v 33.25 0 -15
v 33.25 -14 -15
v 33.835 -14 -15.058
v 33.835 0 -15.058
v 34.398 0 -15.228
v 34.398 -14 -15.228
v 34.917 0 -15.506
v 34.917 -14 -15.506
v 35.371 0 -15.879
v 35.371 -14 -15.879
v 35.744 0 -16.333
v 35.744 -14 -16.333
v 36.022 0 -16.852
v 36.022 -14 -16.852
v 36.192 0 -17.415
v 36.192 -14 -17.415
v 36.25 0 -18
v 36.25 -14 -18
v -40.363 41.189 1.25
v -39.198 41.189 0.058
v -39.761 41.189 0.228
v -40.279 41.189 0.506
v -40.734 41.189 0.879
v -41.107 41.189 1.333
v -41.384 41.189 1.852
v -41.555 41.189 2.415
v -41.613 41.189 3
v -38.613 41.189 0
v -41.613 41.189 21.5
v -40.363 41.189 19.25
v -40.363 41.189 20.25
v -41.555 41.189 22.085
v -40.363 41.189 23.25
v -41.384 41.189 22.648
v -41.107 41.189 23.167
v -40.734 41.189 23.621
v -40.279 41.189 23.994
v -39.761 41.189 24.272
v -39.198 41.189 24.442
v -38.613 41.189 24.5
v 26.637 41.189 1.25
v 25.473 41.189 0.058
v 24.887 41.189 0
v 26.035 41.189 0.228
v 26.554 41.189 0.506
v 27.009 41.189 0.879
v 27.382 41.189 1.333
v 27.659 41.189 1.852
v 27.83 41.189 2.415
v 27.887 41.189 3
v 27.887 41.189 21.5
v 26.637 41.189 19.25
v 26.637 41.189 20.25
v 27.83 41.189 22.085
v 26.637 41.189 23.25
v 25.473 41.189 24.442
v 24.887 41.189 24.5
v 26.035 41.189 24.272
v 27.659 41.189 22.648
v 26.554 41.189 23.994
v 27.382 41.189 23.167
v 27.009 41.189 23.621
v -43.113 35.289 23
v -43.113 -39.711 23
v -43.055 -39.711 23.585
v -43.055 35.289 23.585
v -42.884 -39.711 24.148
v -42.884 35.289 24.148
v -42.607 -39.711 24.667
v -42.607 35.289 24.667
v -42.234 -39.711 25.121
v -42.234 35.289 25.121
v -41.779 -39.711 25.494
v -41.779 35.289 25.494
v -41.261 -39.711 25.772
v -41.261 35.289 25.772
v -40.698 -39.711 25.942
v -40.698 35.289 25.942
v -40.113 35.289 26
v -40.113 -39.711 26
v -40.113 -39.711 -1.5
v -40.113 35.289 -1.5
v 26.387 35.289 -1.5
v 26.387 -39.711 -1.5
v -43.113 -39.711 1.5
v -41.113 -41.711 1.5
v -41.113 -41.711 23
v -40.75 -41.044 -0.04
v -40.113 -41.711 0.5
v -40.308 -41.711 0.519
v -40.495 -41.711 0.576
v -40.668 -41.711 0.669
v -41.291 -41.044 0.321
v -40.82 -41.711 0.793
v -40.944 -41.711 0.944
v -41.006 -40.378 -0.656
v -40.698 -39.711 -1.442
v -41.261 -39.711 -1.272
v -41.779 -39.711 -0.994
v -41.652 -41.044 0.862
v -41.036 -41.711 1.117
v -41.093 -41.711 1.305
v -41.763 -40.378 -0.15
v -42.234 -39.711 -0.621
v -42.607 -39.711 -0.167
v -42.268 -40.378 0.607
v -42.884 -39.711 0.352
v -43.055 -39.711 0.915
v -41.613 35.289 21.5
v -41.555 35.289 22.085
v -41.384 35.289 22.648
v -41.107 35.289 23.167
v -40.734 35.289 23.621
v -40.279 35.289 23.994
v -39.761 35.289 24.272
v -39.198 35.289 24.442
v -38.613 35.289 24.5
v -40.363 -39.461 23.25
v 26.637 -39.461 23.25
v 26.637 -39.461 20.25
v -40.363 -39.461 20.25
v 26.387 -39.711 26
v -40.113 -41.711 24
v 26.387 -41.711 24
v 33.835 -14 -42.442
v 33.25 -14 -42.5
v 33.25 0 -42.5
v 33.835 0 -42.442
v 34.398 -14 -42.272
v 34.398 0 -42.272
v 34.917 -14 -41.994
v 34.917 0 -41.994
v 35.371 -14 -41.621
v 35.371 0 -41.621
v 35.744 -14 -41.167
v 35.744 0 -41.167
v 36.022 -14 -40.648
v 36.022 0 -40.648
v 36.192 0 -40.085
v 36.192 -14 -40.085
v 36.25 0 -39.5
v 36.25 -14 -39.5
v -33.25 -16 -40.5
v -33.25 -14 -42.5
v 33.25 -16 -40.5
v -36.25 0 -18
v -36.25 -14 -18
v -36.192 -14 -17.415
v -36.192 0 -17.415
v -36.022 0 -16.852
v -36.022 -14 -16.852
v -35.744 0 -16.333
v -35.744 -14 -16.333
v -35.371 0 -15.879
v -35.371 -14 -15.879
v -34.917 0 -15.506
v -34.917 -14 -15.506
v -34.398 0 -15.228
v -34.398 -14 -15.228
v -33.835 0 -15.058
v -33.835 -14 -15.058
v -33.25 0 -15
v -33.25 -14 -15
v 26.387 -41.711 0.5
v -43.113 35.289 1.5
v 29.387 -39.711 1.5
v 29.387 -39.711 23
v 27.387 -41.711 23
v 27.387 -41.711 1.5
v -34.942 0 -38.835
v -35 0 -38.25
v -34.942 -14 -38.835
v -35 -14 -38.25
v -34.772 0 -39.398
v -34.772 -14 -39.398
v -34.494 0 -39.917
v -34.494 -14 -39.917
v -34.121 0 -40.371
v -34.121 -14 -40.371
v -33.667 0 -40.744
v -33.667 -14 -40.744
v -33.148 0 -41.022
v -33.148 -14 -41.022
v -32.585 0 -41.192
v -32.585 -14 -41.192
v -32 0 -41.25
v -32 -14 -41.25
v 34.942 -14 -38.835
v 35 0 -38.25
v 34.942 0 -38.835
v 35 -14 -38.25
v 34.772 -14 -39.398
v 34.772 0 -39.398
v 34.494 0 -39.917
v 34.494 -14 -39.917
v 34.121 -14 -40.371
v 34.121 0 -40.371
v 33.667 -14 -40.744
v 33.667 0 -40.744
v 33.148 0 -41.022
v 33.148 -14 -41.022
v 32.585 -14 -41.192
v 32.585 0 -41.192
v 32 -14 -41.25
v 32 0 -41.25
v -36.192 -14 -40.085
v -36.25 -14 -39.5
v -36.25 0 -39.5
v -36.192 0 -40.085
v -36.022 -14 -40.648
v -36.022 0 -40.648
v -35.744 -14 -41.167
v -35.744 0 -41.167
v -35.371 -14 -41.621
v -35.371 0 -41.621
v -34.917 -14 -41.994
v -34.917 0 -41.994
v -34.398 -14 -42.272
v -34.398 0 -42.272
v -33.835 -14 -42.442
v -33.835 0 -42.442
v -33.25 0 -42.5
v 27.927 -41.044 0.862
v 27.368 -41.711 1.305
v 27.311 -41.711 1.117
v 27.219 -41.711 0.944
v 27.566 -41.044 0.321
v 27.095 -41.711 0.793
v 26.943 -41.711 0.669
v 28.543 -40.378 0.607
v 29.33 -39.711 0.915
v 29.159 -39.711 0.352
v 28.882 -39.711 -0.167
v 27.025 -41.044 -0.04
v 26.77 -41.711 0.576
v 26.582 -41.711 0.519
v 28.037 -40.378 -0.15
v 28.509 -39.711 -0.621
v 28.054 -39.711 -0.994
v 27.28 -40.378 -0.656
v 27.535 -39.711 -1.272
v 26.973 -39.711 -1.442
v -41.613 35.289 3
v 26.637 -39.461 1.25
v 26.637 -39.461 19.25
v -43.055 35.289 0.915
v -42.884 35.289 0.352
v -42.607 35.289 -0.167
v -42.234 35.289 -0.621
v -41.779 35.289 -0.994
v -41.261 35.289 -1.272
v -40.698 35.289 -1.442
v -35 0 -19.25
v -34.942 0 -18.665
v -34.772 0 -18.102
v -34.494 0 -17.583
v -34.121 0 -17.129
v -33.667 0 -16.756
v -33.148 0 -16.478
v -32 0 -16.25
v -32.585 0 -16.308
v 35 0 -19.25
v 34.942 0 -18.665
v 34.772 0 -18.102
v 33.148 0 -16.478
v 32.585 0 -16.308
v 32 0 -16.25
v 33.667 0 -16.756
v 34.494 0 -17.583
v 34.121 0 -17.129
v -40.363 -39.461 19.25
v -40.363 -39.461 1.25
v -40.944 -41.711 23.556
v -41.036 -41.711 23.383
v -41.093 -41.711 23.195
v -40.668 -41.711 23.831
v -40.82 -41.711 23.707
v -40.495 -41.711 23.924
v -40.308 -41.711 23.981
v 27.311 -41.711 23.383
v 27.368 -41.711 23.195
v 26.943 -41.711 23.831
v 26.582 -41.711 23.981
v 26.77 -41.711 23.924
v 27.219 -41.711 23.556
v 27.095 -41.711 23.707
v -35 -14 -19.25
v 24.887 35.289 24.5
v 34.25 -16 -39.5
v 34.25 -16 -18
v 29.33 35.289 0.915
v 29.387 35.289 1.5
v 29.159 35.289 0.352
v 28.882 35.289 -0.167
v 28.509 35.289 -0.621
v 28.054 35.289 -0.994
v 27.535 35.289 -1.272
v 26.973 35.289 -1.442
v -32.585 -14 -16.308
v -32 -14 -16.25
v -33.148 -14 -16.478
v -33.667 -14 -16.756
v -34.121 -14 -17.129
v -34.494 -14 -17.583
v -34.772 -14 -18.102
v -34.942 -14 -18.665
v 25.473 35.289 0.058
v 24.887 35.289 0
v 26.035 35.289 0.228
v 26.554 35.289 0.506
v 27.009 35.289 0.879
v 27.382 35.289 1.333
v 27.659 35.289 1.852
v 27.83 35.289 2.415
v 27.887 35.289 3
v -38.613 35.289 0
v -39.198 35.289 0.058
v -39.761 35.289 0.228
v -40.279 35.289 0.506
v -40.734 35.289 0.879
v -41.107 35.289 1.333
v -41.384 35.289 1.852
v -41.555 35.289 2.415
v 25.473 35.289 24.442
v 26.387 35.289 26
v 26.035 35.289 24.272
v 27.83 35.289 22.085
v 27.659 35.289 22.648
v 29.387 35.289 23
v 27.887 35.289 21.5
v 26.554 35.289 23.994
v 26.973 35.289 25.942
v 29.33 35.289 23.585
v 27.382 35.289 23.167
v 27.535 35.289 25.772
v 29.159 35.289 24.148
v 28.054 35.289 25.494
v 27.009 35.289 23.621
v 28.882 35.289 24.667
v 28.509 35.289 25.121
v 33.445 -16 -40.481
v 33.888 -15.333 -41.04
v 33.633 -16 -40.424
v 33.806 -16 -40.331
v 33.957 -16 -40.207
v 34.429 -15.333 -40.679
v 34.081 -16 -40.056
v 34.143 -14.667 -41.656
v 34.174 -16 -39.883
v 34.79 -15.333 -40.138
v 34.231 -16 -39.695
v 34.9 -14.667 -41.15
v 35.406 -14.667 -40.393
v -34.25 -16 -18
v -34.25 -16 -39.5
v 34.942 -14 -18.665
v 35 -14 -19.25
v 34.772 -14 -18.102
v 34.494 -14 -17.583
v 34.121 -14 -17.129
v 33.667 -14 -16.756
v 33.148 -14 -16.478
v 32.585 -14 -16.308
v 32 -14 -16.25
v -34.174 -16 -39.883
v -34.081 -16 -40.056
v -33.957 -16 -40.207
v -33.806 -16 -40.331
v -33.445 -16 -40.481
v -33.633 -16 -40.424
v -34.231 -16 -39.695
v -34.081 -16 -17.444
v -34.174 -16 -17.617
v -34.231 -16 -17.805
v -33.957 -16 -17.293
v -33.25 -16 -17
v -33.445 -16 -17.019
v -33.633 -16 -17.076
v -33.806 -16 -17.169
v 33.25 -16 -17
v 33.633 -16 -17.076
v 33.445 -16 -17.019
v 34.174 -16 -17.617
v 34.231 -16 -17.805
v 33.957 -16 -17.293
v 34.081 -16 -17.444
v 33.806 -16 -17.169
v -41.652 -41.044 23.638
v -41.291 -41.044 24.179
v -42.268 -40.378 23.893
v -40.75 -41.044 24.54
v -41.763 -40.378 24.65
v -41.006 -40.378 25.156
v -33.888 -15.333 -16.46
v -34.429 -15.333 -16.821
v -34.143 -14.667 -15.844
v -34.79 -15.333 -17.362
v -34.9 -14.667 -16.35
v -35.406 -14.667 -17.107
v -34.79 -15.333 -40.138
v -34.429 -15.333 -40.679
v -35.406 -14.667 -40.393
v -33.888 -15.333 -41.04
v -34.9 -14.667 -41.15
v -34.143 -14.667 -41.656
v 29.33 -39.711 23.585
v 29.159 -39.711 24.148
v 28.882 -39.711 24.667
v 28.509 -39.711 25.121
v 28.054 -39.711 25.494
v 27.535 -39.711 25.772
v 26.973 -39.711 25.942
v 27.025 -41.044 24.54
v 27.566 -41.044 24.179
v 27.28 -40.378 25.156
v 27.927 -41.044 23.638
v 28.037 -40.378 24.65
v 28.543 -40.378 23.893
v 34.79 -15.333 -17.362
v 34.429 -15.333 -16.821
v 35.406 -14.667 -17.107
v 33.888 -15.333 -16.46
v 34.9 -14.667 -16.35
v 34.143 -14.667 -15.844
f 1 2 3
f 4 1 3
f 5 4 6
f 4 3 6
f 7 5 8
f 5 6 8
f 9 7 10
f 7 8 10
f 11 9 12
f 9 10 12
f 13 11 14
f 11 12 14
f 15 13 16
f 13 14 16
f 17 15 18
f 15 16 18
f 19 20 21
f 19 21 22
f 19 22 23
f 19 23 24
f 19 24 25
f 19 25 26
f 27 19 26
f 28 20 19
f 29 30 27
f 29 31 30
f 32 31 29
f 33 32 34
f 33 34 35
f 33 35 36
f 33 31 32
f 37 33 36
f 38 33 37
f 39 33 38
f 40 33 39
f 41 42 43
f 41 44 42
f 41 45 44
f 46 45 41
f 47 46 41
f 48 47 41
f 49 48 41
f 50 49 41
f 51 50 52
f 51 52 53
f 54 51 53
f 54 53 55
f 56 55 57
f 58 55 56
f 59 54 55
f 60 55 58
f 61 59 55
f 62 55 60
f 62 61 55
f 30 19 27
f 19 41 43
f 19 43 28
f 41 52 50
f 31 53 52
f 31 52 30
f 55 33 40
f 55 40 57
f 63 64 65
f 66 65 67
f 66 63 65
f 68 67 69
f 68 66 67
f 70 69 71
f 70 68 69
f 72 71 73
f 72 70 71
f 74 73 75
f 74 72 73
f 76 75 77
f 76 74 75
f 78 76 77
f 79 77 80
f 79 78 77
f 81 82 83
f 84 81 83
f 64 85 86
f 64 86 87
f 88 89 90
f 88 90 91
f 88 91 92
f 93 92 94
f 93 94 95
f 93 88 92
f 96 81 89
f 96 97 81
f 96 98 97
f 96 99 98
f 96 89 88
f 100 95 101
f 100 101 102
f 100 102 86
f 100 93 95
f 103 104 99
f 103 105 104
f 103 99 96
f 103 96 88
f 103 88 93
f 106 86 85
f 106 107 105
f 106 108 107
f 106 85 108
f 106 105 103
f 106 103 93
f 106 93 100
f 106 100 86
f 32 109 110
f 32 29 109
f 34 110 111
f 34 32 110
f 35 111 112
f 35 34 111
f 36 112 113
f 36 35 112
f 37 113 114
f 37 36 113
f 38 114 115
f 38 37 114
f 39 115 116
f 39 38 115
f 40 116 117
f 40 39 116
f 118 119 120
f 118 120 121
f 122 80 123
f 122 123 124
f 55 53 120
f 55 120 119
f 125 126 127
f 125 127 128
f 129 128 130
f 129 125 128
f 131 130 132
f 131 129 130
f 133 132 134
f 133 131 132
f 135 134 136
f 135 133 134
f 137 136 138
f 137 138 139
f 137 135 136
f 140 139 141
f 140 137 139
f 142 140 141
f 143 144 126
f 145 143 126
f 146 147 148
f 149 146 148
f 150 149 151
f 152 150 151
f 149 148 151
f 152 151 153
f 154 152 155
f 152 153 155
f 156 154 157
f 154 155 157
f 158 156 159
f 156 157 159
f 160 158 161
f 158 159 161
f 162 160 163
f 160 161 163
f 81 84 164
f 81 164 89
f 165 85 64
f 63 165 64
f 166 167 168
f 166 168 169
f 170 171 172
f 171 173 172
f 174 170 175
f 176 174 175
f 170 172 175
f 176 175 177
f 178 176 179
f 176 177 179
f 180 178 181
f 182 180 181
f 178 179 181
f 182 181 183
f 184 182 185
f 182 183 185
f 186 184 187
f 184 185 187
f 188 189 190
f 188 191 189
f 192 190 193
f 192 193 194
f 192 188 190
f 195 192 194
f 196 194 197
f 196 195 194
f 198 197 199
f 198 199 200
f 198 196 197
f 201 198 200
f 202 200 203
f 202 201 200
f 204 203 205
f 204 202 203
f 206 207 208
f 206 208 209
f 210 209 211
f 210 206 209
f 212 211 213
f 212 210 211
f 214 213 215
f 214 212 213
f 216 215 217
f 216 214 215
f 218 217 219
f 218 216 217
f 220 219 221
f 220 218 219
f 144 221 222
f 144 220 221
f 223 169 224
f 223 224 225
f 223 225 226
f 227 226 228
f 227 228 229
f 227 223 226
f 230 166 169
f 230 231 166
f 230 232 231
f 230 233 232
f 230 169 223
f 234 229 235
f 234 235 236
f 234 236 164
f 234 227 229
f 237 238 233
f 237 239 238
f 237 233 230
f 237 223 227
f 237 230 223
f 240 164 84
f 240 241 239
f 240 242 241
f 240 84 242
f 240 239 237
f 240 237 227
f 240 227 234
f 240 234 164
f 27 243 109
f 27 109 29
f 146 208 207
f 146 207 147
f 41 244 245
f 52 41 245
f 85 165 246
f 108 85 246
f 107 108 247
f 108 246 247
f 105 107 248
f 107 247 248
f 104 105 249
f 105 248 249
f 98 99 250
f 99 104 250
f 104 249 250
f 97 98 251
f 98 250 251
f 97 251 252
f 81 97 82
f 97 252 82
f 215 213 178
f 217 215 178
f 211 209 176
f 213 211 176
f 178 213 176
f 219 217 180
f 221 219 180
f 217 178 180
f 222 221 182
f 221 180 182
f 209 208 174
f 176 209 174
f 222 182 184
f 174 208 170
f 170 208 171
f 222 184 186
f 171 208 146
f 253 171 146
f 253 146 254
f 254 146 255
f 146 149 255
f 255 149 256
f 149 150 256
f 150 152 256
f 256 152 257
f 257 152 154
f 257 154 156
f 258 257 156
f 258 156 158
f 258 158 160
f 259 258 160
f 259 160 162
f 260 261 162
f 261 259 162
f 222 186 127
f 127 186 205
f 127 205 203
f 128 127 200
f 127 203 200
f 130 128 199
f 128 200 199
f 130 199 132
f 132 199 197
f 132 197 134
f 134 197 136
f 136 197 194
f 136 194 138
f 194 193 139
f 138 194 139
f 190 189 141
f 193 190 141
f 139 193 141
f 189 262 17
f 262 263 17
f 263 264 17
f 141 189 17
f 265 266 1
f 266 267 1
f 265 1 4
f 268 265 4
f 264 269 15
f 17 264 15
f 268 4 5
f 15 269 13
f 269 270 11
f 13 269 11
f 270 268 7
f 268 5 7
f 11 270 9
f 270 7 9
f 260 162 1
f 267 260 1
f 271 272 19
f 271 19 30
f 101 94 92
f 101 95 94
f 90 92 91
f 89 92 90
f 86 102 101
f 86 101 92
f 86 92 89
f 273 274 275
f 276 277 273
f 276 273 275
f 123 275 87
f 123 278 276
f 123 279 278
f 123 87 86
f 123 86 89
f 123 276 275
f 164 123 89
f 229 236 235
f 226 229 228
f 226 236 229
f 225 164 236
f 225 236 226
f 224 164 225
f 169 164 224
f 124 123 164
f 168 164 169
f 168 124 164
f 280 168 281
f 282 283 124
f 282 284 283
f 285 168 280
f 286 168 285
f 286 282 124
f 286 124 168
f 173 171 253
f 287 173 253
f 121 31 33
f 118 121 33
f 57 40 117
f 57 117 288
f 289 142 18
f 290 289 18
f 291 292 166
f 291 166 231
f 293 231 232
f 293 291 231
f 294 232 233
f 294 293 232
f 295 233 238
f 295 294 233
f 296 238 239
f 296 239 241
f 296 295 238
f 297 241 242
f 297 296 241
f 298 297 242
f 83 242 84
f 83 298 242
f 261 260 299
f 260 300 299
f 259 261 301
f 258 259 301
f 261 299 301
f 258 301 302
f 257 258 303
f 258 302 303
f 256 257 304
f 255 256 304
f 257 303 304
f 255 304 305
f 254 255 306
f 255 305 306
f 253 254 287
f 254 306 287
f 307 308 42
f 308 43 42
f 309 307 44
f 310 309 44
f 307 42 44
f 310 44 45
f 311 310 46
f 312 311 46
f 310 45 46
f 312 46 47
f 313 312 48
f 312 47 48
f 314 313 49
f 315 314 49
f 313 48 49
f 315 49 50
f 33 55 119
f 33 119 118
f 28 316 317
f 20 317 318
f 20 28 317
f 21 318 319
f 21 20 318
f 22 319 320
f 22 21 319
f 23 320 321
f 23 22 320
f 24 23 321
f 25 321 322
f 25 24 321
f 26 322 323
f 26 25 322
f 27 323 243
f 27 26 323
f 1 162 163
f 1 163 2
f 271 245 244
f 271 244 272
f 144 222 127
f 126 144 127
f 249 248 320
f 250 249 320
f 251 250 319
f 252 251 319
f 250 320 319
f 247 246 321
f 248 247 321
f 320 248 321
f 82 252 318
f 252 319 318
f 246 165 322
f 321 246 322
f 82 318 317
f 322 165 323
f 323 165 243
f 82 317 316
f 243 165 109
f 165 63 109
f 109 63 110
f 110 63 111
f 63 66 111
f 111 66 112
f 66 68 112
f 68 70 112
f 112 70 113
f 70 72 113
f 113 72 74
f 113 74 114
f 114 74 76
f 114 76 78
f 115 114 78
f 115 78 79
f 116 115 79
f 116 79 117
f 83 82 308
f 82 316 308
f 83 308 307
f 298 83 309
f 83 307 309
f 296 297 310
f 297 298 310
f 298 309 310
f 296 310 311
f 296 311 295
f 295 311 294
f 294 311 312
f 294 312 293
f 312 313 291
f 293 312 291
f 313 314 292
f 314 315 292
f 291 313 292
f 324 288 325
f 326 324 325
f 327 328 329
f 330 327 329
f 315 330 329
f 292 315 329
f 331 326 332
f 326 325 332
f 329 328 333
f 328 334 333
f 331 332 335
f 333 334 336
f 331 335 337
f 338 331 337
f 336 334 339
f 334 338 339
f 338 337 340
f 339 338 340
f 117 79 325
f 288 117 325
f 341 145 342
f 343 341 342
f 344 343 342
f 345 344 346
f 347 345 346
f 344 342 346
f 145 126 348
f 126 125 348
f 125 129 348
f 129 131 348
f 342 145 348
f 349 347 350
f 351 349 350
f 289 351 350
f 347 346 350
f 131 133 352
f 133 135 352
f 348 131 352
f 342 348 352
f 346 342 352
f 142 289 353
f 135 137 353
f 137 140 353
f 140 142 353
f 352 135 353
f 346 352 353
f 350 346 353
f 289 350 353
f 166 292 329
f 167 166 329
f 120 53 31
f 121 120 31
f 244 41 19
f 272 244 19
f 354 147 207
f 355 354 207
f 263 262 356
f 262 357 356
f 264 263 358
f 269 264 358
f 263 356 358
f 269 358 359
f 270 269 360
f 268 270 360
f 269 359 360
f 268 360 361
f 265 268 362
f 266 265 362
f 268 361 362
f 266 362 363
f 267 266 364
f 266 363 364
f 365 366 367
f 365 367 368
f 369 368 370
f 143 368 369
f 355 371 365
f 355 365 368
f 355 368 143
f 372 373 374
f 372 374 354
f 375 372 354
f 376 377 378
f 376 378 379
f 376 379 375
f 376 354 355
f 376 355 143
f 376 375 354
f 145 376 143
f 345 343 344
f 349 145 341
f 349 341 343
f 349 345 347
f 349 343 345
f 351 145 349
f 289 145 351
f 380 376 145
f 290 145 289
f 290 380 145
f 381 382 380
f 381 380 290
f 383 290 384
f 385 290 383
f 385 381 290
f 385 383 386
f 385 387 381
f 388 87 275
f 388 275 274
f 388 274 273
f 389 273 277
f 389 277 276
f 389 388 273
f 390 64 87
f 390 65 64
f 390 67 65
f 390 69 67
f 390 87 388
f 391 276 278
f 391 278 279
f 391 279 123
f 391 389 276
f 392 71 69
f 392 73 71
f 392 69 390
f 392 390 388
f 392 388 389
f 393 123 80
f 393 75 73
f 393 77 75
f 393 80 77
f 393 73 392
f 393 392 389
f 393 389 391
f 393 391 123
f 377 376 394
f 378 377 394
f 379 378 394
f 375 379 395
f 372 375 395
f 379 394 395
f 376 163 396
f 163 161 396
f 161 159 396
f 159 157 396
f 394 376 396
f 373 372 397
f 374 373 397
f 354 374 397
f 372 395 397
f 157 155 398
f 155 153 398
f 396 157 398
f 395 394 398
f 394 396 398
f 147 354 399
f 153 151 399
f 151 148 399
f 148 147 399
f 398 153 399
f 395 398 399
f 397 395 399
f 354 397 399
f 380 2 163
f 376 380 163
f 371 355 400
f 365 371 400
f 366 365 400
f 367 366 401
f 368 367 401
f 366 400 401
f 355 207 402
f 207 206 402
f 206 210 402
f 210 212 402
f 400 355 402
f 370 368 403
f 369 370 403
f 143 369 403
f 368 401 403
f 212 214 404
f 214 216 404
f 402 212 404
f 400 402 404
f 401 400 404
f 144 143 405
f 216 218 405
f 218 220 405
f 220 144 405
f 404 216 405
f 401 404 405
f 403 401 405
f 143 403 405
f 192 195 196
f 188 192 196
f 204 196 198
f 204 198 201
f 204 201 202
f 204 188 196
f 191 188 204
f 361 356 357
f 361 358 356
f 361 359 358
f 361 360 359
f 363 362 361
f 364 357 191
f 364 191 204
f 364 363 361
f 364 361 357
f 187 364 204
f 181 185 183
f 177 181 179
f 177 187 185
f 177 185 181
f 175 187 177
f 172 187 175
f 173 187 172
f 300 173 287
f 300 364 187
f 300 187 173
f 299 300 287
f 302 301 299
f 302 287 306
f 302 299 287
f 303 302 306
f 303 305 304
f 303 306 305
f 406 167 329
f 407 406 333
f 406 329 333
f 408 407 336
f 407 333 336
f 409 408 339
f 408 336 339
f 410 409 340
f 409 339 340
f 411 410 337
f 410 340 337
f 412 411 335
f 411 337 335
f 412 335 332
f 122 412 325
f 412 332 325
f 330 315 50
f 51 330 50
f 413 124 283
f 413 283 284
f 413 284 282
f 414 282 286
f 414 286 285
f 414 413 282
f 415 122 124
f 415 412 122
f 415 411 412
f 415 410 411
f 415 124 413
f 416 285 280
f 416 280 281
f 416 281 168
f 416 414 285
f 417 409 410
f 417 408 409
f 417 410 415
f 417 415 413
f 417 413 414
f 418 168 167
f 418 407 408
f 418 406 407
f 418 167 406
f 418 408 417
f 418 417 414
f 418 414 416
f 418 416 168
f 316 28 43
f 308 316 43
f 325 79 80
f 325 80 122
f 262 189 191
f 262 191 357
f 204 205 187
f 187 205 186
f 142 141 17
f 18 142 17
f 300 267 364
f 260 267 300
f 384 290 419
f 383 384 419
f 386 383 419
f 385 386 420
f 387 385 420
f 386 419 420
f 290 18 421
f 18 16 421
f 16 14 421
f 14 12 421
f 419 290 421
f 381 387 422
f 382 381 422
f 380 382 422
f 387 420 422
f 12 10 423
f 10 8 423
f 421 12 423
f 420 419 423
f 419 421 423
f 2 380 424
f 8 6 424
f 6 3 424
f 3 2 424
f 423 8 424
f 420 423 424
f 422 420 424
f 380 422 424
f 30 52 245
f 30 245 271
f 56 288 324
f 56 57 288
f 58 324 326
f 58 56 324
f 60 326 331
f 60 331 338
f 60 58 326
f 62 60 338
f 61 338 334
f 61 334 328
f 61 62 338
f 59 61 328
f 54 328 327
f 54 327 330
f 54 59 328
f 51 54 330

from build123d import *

# Parameters (mm, degrees)
F0_W       = 69.5
F0_H       = 89.25
F1_DEPTH   = 24.5
F2_W       = 67
F2_H       = 18
F3_DEPTH   = 87
F4_W       = 67
F4_H       = 3
F5_DEPTH   = 87
F6_W       = 72.5
F6_H       = 27.5
F6_W_2     = 69.5
F6_H_2     = 24.5
F7_DEPTH   = 77
F8_W       = 6.35
F8_H       = 24.5
F1_FACE3_W = 12.25
F1_FACE3_H = 24.5
F9_DEPTH   = 70
F10_W      = 72.5
F10_H      = 27.5
F11_DEPTH  = 16
F12_W      = 70
F12_H      = 25
F13_DEPTH  = 14
F14_R      = 3
F15_SIZE   = 2
F16_R      = 3
F17_SIZE   = 2
F18_R      = 3
F19_R      = 3


# Not quite as in the source:
# - a feature names something its author has since deleted; it is built from what else it names


with BuildPart() as f1:
    # F0 (on Top) → F1 (new body)
    with BuildSketch(Plane.XY):
        with Locations((-6.8625951707, 2.9138845081)):
            Rectangle(F0_W, F0_H)
    extrude(amount=F1_DEPTH)

    # F2 (on face) → F3 (cut)
    with BuildSketch(Plane(origin=(0, 47.5388845081, 0), x_dir=(-1, 0, 0), z_dir=(0, 1, 0))):
        with Locations((6.8625951707, 10.25)):
            Rectangle(F2_W, F2_H)
    extrude(amount=-F3_DEPTH, mode=Mode.SUBTRACT)

    # F4 (on face) → F5 (cut)
    with BuildSketch(Plane(origin=(0, 47.5388845081, 0), x_dir=(-1, 0, 0), z_dir=(0, 1, 0))):
        with Locations((6.8625951707, 21.75)):
            Rectangle(F4_W, F4_H)
    extrude(amount=-F5_DEPTH, mode=Mode.SUBTRACT)

    # F6 (on face) → F7 (join)
    with BuildSketch(Plane.XZ.offset(41.7111154919)):
        with Locations((-6.8625951707, 12.25)):
            Rectangle(F6_W, F6_H)
        with Locations((-6.8625951707, 12.25)):
            Rectangle(F6_W_2, F6_H_2, mode=Mode.SUBTRACT)
    extrude(amount=-F7_DEPTH)

    # F8 (on face) + F1_face3 (on face) → F9 (cut)
    with BuildSketch(Plane.YZ.offset(27.8874048293)):
        with Locations((44.3638845081, 12.25)):
            Rectangle(F8_W, F8_H)
    with BuildSketch(Plane(origin=(-41.6125951707, 41.4138845081, 12.25), x_dir=(0, -1, 0), z_dir=(-1, 0, 0))):
        Rectangle(F1_FACE3_W, F1_FACE3_H)
    extrude(amount=-F9_DEPTH, dir=(1, 0, 0), mode=Mode.SUBTRACT)

    # F16
    f16_edges = [f1.edges().sort_by_distance(p)[0] for p in [
        (29.387405, -3.211115, -1.5),
        (29.387405, -3.211115, 26),
        (-43.112595, -3.211115, -1.5),
        (-43.112595, -3.211115, 26),
    ]]
    fillet(f16_edges, radius=F16_R)

    # F17
    f17_edges = [f1.edges().sort_by_distance(p)[0] for p in [
        (-6.862595, -41.711115, 26),
        (28.508725, -41.711115, 25.12132),
        (-42.233916, -41.711115, 25.12132),
        (29.387405, -41.711115, 12.25),
        (-43.112595, -41.711115, 12.25),
        (28.508725, -41.711115, -0.62132),
        (-42.233916, -41.711115, -0.62132),
        (-6.862595, -41.711115, -1.5),
    ]]
    chamfer(f17_edges, length=F17_SIZE)

    # F18
    f18_edges = [f1.edges().sort_by_distance(p)[0] for p in [
        (-41.612595, 38.238885, 24.5),
        (27.887405, 38.238885, 24.5),
        (-41.612595, 38.238885, 0),
        (27.887405, 38.238885, 0),
    ]]
    fillet(f18_edges, radius=F18_R)


with BuildPart() as f11:
    # F10 (on Front) → F11 (new body)
    with BuildSketch(Plane.XZ):
        with Locations((0, -28.75)):
            Rectangle(F10_W, F10_H)
    extrude(amount=F11_DEPTH)

    # F12 (on face) → F13 (cut)
    with BuildSketch(Plane(origin=(0, 0, 0), x_dir=(-1, 0, 0), z_dir=(0, 1, 0))):
        with Locations((0, -28.75)):
            Rectangle(F12_W, F12_H)
    extrude(amount=-F13_DEPTH, mode=Mode.SUBTRACT)

    # F14
    f14_edges = [f11.edges().sort_by_distance(p)[0] for p in [
        (36.25, -8, -42.5),
        (-36.25, -8, -42.5),
        (-36.25, -8, -15),
        (36.25, -8, -15),
    ]]
    fillet(f14_edges, radius=F14_R)

    # F15
    f15_edges = [f11.edges().sort_by_distance(p)[0] for p in [
        (0, -16, -42.5),
    ]]
    chamfer(f15_edges, length=F15_SIZE)

    # F19
    f19_edges = [f11.edges().sort_by_distance(p)[0] for p in [
        (-35, -7, -16.25),
        (35, -7, -16.25),
        (-35, -7, -41.25),
        (35, -7, -41.25),
    ]]
    fillet(f19_edges, radius=F19_R)


solid = Compound([f1.part, f11.part])
